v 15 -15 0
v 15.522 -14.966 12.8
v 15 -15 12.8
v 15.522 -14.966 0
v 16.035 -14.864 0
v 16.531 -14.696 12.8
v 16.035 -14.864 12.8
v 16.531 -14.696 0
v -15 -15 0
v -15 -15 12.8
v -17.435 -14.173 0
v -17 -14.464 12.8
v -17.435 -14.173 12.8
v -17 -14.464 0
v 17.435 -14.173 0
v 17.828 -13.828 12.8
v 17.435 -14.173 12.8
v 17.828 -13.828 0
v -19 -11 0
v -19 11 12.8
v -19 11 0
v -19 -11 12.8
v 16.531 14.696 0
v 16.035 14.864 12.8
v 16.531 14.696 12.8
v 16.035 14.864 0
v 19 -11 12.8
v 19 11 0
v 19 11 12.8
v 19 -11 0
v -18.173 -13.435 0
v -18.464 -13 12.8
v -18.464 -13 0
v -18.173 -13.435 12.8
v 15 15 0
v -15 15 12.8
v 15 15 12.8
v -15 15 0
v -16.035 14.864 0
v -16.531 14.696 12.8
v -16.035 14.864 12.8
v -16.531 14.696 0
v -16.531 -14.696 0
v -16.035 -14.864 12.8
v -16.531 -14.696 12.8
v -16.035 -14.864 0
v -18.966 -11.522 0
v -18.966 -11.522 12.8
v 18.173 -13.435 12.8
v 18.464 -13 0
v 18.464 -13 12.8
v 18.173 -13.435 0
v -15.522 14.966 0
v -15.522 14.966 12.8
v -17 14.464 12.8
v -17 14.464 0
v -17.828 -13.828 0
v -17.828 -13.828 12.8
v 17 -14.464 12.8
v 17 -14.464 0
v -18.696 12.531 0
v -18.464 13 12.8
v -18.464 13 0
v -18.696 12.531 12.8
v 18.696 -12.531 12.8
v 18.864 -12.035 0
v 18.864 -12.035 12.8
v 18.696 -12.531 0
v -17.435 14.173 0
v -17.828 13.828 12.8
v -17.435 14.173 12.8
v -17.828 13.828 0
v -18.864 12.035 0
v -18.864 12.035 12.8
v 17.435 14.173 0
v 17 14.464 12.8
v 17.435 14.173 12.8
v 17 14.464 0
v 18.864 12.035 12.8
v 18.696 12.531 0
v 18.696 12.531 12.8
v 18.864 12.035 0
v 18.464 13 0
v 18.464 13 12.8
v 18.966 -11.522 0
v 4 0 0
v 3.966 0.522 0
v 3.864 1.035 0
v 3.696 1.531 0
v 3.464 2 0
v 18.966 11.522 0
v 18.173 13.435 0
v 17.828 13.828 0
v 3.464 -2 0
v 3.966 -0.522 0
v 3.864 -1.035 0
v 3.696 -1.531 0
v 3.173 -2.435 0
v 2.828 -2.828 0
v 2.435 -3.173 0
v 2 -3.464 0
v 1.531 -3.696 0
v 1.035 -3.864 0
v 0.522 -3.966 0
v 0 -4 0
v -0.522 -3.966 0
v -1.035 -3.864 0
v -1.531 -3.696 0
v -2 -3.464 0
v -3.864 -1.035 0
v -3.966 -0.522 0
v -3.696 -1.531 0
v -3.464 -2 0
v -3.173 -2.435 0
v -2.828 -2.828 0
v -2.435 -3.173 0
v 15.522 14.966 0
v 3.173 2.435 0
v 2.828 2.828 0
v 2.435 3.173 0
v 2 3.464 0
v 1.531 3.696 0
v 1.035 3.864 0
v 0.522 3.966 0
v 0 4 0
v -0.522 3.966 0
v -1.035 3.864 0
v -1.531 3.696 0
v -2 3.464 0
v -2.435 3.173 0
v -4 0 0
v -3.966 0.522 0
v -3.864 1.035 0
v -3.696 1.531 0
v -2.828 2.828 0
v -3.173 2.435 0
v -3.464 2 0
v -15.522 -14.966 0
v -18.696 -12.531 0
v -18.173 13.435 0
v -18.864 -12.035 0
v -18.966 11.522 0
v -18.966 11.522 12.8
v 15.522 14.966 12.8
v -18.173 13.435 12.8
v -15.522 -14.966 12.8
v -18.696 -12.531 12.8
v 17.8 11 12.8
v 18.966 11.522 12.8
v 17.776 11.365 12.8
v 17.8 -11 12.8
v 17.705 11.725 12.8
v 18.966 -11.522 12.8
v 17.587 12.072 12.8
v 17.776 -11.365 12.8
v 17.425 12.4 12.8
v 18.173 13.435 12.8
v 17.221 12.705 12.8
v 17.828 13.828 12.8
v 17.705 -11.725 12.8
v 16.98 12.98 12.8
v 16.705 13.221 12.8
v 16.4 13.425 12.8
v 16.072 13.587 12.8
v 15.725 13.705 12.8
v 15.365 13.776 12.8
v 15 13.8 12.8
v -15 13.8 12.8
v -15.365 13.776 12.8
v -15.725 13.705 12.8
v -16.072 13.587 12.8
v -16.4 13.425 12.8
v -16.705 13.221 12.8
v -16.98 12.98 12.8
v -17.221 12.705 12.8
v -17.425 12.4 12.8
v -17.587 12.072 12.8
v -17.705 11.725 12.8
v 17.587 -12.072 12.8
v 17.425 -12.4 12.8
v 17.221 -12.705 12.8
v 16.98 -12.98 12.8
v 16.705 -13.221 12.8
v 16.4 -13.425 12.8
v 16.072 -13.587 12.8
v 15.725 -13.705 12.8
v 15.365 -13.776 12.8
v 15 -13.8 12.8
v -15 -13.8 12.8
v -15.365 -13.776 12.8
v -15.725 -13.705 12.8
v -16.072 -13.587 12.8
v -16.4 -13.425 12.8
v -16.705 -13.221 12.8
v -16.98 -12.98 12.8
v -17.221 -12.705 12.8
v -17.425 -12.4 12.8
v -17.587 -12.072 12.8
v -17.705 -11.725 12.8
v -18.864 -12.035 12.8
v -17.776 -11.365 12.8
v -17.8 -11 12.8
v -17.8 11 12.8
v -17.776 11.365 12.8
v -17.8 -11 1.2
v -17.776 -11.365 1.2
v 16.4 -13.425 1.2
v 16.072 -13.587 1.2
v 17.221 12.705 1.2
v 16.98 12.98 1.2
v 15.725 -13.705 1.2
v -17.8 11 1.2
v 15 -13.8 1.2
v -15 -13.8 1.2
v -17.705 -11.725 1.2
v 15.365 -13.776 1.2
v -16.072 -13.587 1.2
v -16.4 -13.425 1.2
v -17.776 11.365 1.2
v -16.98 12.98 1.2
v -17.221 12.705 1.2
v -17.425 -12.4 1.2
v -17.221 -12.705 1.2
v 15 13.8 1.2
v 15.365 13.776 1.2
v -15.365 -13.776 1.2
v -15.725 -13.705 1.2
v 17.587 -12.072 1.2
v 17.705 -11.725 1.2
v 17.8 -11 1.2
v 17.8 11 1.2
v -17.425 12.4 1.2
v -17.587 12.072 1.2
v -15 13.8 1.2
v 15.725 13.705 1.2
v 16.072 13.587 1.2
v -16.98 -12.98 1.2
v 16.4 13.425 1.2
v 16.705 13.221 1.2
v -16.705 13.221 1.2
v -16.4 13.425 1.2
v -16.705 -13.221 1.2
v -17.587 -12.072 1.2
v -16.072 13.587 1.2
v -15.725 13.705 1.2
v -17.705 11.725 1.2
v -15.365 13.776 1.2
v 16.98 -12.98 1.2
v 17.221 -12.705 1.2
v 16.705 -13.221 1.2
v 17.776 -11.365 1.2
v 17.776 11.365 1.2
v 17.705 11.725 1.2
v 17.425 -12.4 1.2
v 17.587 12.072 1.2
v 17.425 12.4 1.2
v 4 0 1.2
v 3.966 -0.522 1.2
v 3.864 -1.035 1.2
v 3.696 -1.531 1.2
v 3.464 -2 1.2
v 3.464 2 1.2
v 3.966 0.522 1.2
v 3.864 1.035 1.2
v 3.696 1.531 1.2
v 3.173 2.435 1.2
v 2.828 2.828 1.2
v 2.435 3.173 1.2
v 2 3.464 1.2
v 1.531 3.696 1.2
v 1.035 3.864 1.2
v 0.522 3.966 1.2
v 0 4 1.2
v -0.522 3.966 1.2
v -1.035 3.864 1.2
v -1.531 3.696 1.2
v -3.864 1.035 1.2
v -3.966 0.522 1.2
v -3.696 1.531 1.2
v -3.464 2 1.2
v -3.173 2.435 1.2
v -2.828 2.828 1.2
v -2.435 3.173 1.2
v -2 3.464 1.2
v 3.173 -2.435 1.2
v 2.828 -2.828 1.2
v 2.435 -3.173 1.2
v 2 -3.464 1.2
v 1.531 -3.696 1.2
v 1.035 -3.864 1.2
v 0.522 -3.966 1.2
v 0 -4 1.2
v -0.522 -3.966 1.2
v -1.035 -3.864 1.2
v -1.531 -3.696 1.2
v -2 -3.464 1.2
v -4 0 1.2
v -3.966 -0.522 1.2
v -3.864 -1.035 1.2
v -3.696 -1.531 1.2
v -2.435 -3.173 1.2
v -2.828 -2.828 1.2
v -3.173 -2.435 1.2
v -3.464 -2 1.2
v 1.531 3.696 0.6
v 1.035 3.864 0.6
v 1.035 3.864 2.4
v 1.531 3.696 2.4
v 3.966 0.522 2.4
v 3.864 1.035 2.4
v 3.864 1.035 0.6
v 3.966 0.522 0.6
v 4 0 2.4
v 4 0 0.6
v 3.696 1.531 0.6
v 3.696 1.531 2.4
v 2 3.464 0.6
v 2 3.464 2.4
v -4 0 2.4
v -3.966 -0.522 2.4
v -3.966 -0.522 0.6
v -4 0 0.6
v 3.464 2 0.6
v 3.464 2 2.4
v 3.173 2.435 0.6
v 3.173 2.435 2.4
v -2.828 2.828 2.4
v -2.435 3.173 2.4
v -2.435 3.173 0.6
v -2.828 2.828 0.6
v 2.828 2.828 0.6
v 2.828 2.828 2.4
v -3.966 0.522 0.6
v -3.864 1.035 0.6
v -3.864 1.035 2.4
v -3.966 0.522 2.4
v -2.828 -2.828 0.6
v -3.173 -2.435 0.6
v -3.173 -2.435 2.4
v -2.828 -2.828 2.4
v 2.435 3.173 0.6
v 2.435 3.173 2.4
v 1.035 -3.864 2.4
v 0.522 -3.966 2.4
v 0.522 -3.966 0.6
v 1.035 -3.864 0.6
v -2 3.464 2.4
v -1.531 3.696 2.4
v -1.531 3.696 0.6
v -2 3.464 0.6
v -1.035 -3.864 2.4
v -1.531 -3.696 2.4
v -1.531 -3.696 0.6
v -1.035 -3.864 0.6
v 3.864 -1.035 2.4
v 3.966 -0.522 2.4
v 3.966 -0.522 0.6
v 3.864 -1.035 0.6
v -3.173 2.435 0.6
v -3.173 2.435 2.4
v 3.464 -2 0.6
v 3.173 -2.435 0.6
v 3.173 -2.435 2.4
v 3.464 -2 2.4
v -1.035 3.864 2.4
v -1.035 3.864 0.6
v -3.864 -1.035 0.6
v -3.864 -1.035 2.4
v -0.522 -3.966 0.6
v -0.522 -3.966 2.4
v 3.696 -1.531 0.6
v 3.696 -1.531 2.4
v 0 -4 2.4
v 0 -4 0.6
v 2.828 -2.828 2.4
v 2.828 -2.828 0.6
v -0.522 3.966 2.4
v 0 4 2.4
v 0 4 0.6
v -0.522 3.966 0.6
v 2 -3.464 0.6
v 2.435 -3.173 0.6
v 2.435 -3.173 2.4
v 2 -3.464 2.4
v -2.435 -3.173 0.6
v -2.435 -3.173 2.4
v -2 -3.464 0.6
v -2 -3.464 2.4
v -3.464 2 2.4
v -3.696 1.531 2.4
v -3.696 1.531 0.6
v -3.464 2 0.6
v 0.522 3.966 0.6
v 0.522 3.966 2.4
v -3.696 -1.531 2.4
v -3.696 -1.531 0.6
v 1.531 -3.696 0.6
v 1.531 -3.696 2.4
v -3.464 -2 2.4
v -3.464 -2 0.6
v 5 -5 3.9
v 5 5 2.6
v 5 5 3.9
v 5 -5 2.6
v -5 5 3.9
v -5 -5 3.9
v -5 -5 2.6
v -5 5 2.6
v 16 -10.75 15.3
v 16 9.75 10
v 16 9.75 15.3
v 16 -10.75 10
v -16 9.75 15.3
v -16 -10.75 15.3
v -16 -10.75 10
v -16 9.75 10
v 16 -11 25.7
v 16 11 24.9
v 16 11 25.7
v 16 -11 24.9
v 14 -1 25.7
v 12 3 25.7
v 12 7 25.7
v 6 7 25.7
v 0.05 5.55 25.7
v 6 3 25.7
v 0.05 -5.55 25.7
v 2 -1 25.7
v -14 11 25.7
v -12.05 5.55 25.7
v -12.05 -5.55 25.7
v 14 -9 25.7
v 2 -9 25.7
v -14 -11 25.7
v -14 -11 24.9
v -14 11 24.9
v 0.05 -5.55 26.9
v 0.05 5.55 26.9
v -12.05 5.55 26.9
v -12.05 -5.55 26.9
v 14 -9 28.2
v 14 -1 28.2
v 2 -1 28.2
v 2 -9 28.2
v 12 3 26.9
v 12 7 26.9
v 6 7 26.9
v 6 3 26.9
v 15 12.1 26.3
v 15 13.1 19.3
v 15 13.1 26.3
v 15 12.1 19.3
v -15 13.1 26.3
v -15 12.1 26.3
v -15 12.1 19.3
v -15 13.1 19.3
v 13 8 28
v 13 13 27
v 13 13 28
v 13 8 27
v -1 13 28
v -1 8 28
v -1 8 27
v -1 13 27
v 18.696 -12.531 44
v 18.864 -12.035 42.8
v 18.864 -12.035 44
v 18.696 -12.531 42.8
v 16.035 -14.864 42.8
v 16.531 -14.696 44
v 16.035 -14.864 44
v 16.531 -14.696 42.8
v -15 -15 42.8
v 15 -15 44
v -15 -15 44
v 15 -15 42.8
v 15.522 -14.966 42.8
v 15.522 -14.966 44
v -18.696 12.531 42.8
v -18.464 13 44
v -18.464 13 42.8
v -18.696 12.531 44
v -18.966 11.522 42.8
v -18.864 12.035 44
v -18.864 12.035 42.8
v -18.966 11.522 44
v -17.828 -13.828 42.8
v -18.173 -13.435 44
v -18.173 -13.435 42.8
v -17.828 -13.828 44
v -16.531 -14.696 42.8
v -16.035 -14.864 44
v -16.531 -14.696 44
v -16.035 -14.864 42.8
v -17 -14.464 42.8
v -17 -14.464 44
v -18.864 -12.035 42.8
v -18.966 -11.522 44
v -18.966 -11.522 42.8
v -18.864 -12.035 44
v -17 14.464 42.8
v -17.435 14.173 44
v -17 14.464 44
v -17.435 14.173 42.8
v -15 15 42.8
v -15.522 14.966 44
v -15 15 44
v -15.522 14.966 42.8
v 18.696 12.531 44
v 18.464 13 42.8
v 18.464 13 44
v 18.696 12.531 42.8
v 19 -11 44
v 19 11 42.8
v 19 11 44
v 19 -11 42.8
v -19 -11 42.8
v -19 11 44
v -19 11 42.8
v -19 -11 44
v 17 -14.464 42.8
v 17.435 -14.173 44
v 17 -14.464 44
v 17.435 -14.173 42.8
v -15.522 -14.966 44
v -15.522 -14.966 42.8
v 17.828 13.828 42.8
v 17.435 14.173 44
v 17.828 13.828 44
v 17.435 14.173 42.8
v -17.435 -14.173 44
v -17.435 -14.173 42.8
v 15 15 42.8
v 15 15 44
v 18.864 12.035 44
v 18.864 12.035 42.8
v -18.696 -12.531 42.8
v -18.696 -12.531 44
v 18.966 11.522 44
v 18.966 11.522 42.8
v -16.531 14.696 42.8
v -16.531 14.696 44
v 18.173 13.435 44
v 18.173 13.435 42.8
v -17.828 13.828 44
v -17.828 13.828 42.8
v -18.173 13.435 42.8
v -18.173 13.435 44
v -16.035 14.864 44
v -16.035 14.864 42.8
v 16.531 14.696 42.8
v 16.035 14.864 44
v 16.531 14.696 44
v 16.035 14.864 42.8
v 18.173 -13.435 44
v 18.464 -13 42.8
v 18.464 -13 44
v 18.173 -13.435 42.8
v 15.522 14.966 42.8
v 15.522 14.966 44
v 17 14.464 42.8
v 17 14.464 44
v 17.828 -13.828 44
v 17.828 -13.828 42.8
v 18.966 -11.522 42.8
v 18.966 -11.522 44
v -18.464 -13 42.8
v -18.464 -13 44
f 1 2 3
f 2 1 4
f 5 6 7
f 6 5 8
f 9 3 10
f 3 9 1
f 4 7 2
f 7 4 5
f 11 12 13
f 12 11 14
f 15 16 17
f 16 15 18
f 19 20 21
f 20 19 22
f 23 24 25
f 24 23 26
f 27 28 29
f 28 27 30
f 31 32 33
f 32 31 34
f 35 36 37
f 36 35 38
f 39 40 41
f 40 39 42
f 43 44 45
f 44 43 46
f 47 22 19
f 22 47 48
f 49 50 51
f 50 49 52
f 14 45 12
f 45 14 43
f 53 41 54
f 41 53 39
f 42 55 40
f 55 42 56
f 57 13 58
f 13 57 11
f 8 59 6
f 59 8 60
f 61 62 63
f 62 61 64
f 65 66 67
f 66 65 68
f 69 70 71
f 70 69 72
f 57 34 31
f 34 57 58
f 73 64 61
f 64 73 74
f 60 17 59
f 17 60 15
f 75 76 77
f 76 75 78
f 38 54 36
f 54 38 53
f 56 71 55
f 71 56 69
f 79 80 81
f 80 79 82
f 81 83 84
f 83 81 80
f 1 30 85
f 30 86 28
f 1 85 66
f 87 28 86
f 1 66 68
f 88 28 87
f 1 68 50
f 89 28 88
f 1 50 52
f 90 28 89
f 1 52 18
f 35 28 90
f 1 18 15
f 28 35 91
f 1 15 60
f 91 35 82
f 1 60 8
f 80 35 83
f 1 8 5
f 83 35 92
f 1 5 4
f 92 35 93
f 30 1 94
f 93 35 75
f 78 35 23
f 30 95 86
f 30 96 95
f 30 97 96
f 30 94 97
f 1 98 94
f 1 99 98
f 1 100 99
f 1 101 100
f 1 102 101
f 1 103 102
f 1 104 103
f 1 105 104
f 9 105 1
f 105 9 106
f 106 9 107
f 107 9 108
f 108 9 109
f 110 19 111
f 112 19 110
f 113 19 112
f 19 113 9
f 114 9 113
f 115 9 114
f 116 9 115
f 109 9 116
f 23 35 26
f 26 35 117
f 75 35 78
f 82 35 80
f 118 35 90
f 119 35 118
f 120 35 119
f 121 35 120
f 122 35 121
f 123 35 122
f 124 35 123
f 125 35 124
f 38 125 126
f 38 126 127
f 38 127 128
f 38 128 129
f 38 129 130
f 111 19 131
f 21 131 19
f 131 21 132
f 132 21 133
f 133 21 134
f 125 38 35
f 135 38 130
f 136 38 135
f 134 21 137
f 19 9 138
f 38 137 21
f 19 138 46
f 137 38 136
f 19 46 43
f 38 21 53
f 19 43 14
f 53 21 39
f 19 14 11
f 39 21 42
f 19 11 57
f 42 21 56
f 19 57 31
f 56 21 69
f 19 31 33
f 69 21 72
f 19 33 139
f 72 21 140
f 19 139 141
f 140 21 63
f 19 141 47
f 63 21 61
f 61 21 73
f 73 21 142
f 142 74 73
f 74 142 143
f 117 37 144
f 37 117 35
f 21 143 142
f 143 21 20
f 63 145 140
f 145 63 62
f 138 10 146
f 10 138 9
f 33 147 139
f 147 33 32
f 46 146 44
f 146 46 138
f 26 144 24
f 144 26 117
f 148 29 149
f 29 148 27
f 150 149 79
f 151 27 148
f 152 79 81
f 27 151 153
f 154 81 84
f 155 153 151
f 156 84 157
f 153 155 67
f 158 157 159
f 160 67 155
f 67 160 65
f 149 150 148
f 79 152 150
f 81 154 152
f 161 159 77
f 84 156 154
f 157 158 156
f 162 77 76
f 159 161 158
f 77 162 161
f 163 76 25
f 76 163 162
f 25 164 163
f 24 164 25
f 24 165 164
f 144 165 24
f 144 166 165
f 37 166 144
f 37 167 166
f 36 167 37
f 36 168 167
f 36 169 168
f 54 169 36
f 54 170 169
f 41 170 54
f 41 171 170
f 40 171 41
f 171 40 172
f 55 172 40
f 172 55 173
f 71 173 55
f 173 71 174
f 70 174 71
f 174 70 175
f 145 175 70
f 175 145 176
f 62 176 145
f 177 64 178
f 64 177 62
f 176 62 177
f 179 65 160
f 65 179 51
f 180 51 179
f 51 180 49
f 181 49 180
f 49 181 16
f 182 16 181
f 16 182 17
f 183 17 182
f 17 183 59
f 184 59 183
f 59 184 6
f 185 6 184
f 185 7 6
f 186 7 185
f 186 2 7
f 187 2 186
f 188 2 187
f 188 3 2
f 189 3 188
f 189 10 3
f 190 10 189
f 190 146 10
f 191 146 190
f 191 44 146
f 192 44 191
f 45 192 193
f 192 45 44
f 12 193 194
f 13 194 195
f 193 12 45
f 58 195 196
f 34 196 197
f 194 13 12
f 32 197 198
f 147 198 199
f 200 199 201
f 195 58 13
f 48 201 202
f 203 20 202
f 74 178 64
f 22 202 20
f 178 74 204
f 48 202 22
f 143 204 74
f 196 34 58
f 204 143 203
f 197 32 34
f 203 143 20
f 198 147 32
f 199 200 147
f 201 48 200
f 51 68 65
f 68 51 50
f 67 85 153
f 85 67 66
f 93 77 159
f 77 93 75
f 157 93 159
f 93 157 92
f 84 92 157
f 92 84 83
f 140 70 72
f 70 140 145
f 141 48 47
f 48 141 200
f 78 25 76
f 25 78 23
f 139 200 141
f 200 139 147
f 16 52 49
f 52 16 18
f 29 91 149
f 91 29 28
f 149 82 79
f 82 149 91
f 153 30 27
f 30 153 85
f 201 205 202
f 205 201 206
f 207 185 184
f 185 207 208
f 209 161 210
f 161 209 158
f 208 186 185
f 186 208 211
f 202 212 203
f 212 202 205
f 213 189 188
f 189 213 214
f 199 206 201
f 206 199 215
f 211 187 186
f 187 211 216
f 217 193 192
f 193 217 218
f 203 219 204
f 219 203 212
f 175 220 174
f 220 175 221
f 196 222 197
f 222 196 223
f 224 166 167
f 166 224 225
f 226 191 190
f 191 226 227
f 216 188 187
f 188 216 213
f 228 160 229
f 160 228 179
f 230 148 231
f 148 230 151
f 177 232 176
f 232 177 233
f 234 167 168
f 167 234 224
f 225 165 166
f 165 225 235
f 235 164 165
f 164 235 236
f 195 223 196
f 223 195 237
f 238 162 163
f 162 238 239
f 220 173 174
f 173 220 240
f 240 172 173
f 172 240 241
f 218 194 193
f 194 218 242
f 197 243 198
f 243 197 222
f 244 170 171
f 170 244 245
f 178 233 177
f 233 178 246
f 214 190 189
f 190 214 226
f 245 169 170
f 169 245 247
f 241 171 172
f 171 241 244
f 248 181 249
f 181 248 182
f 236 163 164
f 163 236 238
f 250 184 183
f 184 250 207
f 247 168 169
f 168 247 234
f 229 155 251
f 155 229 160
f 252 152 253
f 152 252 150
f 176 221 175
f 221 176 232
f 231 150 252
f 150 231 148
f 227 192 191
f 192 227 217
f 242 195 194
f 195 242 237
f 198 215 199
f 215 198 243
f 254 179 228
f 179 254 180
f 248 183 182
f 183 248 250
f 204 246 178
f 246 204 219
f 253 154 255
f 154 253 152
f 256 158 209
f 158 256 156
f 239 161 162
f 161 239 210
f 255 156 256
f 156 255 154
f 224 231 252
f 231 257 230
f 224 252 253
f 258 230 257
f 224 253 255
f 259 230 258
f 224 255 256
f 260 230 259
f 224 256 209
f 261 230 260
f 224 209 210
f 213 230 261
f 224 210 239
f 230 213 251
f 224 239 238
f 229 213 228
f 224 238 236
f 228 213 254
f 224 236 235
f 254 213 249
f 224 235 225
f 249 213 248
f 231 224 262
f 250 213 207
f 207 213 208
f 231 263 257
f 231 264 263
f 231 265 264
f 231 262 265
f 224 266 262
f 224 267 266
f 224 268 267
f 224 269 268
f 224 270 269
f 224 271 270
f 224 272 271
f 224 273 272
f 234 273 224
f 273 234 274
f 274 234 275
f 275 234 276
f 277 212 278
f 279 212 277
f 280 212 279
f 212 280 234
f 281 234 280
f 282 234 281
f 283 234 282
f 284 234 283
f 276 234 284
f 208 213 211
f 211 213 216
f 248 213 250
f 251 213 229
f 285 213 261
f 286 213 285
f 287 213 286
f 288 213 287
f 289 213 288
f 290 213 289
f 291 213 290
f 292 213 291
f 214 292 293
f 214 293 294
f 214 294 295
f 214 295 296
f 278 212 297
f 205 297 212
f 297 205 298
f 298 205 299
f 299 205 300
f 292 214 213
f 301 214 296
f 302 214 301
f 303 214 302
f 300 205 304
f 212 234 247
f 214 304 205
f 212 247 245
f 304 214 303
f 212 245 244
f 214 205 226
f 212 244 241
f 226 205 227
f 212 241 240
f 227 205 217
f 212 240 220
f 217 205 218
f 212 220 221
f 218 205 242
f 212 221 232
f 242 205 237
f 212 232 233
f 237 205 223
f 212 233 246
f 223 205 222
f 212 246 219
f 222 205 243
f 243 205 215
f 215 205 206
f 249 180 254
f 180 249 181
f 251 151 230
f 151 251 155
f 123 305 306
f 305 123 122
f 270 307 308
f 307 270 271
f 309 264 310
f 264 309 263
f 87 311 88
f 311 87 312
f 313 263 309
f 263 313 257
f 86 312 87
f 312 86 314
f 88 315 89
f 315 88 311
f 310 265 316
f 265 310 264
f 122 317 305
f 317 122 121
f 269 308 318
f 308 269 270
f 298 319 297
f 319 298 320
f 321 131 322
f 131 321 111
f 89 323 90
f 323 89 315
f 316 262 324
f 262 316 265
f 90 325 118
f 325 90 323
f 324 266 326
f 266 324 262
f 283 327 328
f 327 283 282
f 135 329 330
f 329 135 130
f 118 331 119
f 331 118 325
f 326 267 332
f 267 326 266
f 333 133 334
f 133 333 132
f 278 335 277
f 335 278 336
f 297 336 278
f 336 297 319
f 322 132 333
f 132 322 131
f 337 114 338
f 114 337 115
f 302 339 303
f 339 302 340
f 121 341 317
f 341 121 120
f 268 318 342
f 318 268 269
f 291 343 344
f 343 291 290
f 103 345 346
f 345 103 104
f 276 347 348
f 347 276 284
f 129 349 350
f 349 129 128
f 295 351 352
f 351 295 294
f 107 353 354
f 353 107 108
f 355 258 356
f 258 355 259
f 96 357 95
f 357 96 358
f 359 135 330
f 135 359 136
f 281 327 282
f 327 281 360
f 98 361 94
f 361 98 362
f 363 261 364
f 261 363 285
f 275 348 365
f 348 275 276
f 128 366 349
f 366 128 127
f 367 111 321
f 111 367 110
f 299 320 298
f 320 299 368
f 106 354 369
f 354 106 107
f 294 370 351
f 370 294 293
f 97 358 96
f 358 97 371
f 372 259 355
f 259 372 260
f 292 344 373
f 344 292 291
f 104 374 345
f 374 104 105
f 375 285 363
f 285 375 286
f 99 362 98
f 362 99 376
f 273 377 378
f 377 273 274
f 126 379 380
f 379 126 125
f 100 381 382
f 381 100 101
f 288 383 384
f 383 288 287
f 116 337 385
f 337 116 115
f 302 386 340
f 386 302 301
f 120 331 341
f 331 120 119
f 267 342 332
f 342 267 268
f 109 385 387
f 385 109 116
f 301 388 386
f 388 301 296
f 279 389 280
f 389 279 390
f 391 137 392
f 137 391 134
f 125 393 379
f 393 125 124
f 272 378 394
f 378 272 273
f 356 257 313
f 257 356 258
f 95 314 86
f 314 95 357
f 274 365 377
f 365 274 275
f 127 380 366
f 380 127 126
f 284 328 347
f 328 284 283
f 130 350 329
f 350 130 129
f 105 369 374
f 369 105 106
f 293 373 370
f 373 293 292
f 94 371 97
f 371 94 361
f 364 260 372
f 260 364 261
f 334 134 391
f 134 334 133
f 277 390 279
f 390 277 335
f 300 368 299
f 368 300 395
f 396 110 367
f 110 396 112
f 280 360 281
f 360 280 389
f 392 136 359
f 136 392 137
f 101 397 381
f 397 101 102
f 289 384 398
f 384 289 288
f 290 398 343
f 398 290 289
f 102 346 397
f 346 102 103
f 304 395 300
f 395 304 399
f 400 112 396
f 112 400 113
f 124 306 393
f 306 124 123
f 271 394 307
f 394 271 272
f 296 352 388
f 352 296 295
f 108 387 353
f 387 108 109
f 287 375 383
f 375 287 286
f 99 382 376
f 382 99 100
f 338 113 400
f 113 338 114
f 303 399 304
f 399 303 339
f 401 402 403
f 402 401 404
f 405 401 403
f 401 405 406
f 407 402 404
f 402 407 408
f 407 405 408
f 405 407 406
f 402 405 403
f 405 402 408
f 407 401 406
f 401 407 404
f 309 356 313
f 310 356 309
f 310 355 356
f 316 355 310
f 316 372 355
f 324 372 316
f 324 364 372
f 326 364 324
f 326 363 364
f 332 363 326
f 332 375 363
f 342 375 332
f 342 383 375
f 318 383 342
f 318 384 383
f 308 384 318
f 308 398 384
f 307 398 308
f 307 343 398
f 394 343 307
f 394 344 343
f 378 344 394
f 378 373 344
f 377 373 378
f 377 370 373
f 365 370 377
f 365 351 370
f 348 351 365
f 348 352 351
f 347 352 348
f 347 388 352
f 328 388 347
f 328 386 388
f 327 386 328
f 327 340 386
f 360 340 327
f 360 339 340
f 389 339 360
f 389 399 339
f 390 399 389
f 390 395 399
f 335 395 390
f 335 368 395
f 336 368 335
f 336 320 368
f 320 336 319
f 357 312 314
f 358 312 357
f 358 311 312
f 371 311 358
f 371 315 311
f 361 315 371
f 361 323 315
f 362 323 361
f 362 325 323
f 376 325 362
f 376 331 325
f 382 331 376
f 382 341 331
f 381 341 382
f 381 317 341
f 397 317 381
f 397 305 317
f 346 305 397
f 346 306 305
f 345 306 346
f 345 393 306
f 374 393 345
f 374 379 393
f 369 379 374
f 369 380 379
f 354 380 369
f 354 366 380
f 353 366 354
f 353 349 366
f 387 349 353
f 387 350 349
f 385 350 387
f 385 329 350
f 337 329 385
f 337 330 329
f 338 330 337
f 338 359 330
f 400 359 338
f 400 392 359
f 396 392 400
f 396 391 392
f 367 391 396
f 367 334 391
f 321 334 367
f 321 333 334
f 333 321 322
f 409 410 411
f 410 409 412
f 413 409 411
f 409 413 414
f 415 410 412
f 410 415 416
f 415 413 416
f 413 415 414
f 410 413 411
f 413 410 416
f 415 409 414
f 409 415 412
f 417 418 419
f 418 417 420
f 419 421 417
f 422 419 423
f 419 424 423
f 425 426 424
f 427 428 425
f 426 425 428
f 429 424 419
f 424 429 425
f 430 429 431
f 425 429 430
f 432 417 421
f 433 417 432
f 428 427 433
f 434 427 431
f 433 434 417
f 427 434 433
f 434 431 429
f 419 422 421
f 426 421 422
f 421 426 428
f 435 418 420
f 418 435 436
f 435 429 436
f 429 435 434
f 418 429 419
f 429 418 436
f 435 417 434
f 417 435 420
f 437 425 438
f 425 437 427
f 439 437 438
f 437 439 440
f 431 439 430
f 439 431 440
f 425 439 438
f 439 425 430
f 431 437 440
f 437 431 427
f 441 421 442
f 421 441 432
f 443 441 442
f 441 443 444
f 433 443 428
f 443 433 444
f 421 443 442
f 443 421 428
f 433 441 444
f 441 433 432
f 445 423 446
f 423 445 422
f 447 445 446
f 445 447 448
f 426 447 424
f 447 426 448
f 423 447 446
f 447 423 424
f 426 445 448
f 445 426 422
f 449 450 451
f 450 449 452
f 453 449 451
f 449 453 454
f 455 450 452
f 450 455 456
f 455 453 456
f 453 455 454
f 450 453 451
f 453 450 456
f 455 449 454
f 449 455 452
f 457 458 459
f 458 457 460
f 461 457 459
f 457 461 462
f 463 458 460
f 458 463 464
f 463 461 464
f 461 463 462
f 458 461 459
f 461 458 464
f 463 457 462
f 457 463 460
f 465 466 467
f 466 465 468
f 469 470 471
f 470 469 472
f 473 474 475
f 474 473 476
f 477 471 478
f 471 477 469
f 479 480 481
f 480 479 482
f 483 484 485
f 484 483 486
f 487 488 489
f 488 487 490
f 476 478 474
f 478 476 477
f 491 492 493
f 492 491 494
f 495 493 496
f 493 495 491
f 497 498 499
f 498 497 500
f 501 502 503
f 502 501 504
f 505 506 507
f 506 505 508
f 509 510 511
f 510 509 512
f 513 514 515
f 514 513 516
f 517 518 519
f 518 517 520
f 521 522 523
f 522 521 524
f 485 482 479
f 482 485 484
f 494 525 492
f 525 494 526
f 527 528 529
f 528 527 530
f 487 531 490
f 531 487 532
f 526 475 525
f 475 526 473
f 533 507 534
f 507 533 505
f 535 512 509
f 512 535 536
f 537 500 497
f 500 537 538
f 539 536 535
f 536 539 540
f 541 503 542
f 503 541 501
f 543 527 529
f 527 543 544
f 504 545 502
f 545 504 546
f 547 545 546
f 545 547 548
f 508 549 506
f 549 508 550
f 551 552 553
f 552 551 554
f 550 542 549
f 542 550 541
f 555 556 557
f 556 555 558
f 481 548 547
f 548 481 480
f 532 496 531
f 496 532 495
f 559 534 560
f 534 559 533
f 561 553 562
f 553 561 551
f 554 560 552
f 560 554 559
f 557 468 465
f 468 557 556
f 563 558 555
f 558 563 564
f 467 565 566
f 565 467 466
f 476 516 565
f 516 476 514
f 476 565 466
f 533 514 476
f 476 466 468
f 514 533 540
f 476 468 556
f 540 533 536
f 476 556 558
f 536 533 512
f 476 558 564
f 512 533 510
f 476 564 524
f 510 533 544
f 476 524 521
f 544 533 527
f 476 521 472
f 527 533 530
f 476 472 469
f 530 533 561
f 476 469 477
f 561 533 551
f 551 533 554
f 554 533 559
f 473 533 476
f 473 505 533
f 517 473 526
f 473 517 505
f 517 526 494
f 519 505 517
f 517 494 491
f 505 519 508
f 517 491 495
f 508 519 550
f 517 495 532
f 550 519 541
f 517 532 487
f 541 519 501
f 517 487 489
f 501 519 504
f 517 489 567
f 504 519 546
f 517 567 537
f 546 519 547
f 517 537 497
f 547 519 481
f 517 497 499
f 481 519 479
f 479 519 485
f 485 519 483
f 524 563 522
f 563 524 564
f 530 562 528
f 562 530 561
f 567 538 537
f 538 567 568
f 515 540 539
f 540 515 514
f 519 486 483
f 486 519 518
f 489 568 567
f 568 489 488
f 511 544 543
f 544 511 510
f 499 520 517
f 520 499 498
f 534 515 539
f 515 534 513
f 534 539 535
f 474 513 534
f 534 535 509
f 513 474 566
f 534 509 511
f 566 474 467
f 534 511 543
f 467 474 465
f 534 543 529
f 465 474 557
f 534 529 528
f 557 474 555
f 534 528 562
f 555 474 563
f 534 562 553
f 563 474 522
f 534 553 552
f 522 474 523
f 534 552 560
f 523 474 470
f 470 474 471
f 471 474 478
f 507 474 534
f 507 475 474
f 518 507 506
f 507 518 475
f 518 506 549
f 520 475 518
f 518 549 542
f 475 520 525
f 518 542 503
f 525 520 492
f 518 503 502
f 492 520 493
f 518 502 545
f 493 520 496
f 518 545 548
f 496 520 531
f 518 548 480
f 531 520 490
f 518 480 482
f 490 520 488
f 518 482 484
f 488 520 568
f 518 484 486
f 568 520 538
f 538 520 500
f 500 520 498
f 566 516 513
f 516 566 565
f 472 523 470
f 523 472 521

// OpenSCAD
// Collar tracker / packaging study 0.1 / dimensions in mm.
// This is a volume allocation, not a routed PCB or a proven antenna design.
// The health head, antenna shapes and all circuit blocks except nRF9151 are
// reservations. No sealed enclosure, fastening or strain relief is designed.
// Open in OpenSCAD and change variant/view_mode. Render before exporting.

variant = "compact_250"; // [compact_250,reference_500]
view_mode = "exploded"; // [exploded,section,assembled,mockup]
$fn = 48;

compact = variant == "compact_250";
body = compact ? [38,30,14] : [44,36,14];
wall = 1.2;
corner = 4;
lid_z = body[2]-wall;
// EEMB 250mAh pack example: supplier listings differ by 1mm; use 32mm length.
// 500mAh reference: Adafruit 1578. Both are mechanical examples, not selected.
cell = compact ? [32,20.5,5.3] : [36,29,4.75];
cell_y = compact ? -0.5 : -0.5;
cell_z = 3;
pcb = [30,22,0.8];
pcb_z = 8.9;
antenna_y = body[1]/2-wall-1.2;
lift = view_mode == "exploded" ? 1 : 0;

module rounded_prism(size, radius) {
    linear_extrude(height=size[2])
        offset(r=radius)
            square([size[0]-2*radius,size[1]-2*radius],center=true);
}

module base() {
    difference() {
        rounded_prism([body[0],body[1],lid_z],corner);
        translate([0,0,wall])
            rounded_prism([body[0]-2*wall,body[1]-2*wall,body[2]],corner-wall);
        // Placeholder contact-window opening. Optical material and sealing TBD.
        translate([0,0,-1]) cylinder(d=8,h=wall+2);
    }
}

module lid() {
    translate([0,0,lid_z]) rounded_prism([body[0],body[1],wall],corner);
}

module block(size, position, tint) {
    color(tint) translate(position)
        translate([-size[0]/2,-size[1]/2,0]) cube(size);
}

module internals() {
    // Pink = provisional health head; sensor/optics/electrodes not selected.
    block([10,10,1.3],[0,0,1.4+lift*1.2],[0.87,0.30,0.55]);
    color([0.87,0.30,0.55]) translate([0,0,-0.6+lift*1.2]) cylinder(d=8,h=1.8);
    // Gold = battery. Allowance around the block is not a cell swelling spec.
    block(cell,[0,cell_y,cell_z+lift*7],[0.88,0.68,0.22]);
    // Green = board envelope; actual PCB not placed or routed.
    block(pcb,[1,0,pcb_z+lift*16],[0.16,0.53,0.39]);
    // Only this package has an individually verified component body dimension.
    block([12.1,11.1,1.2],[-6,0,pcb_z+pcb[2]+lift*16],[0.28,0.33,0.40]);
    // Combined circuit budget: power, eSIM, passives, protection and connectors.
    block([12,8,2.5],[8,-5,pcb_z+pcb[2]+lift*16],[0.45,0.48,0.53]);
    block([6,4,1.2],[9,5,pcb_z+pcb[2]+lift*16],[0.45,0.48,0.53]);
    // Amber = requested antenna volume, NOT a selected or simulated antenna.
    block([30,1,7],[0,antenna_y,3.3+lift*16],[0.98,0.40,0.12]);
    block([14,5,1],[6,antenna_y-2.1,11+lift*16],[0.98,0.40,0.12]);
}

module assembly() {
    color([0.72,0.77,0.83]) base();
    internals();
    color([0.78,0.83,0.89,0.65]) translate([0,0,lift*30]) lid();
}

if (view_mode == "mockup") {
    // Solid sizing dummy only; not the functional enclosure.
    union() {
        rounded_prism(body,corner);
        translate([0,0,-0.6]) cylinder(d=8,h=0.7);
    }
} else if (view_mode == "section") {
    difference() {
        assembly();
        // Cut away front half to expose the height stack.
        translate([-50,-50,-5]) cube([100,50,90]);
    }
} else {
    assembly();
}
